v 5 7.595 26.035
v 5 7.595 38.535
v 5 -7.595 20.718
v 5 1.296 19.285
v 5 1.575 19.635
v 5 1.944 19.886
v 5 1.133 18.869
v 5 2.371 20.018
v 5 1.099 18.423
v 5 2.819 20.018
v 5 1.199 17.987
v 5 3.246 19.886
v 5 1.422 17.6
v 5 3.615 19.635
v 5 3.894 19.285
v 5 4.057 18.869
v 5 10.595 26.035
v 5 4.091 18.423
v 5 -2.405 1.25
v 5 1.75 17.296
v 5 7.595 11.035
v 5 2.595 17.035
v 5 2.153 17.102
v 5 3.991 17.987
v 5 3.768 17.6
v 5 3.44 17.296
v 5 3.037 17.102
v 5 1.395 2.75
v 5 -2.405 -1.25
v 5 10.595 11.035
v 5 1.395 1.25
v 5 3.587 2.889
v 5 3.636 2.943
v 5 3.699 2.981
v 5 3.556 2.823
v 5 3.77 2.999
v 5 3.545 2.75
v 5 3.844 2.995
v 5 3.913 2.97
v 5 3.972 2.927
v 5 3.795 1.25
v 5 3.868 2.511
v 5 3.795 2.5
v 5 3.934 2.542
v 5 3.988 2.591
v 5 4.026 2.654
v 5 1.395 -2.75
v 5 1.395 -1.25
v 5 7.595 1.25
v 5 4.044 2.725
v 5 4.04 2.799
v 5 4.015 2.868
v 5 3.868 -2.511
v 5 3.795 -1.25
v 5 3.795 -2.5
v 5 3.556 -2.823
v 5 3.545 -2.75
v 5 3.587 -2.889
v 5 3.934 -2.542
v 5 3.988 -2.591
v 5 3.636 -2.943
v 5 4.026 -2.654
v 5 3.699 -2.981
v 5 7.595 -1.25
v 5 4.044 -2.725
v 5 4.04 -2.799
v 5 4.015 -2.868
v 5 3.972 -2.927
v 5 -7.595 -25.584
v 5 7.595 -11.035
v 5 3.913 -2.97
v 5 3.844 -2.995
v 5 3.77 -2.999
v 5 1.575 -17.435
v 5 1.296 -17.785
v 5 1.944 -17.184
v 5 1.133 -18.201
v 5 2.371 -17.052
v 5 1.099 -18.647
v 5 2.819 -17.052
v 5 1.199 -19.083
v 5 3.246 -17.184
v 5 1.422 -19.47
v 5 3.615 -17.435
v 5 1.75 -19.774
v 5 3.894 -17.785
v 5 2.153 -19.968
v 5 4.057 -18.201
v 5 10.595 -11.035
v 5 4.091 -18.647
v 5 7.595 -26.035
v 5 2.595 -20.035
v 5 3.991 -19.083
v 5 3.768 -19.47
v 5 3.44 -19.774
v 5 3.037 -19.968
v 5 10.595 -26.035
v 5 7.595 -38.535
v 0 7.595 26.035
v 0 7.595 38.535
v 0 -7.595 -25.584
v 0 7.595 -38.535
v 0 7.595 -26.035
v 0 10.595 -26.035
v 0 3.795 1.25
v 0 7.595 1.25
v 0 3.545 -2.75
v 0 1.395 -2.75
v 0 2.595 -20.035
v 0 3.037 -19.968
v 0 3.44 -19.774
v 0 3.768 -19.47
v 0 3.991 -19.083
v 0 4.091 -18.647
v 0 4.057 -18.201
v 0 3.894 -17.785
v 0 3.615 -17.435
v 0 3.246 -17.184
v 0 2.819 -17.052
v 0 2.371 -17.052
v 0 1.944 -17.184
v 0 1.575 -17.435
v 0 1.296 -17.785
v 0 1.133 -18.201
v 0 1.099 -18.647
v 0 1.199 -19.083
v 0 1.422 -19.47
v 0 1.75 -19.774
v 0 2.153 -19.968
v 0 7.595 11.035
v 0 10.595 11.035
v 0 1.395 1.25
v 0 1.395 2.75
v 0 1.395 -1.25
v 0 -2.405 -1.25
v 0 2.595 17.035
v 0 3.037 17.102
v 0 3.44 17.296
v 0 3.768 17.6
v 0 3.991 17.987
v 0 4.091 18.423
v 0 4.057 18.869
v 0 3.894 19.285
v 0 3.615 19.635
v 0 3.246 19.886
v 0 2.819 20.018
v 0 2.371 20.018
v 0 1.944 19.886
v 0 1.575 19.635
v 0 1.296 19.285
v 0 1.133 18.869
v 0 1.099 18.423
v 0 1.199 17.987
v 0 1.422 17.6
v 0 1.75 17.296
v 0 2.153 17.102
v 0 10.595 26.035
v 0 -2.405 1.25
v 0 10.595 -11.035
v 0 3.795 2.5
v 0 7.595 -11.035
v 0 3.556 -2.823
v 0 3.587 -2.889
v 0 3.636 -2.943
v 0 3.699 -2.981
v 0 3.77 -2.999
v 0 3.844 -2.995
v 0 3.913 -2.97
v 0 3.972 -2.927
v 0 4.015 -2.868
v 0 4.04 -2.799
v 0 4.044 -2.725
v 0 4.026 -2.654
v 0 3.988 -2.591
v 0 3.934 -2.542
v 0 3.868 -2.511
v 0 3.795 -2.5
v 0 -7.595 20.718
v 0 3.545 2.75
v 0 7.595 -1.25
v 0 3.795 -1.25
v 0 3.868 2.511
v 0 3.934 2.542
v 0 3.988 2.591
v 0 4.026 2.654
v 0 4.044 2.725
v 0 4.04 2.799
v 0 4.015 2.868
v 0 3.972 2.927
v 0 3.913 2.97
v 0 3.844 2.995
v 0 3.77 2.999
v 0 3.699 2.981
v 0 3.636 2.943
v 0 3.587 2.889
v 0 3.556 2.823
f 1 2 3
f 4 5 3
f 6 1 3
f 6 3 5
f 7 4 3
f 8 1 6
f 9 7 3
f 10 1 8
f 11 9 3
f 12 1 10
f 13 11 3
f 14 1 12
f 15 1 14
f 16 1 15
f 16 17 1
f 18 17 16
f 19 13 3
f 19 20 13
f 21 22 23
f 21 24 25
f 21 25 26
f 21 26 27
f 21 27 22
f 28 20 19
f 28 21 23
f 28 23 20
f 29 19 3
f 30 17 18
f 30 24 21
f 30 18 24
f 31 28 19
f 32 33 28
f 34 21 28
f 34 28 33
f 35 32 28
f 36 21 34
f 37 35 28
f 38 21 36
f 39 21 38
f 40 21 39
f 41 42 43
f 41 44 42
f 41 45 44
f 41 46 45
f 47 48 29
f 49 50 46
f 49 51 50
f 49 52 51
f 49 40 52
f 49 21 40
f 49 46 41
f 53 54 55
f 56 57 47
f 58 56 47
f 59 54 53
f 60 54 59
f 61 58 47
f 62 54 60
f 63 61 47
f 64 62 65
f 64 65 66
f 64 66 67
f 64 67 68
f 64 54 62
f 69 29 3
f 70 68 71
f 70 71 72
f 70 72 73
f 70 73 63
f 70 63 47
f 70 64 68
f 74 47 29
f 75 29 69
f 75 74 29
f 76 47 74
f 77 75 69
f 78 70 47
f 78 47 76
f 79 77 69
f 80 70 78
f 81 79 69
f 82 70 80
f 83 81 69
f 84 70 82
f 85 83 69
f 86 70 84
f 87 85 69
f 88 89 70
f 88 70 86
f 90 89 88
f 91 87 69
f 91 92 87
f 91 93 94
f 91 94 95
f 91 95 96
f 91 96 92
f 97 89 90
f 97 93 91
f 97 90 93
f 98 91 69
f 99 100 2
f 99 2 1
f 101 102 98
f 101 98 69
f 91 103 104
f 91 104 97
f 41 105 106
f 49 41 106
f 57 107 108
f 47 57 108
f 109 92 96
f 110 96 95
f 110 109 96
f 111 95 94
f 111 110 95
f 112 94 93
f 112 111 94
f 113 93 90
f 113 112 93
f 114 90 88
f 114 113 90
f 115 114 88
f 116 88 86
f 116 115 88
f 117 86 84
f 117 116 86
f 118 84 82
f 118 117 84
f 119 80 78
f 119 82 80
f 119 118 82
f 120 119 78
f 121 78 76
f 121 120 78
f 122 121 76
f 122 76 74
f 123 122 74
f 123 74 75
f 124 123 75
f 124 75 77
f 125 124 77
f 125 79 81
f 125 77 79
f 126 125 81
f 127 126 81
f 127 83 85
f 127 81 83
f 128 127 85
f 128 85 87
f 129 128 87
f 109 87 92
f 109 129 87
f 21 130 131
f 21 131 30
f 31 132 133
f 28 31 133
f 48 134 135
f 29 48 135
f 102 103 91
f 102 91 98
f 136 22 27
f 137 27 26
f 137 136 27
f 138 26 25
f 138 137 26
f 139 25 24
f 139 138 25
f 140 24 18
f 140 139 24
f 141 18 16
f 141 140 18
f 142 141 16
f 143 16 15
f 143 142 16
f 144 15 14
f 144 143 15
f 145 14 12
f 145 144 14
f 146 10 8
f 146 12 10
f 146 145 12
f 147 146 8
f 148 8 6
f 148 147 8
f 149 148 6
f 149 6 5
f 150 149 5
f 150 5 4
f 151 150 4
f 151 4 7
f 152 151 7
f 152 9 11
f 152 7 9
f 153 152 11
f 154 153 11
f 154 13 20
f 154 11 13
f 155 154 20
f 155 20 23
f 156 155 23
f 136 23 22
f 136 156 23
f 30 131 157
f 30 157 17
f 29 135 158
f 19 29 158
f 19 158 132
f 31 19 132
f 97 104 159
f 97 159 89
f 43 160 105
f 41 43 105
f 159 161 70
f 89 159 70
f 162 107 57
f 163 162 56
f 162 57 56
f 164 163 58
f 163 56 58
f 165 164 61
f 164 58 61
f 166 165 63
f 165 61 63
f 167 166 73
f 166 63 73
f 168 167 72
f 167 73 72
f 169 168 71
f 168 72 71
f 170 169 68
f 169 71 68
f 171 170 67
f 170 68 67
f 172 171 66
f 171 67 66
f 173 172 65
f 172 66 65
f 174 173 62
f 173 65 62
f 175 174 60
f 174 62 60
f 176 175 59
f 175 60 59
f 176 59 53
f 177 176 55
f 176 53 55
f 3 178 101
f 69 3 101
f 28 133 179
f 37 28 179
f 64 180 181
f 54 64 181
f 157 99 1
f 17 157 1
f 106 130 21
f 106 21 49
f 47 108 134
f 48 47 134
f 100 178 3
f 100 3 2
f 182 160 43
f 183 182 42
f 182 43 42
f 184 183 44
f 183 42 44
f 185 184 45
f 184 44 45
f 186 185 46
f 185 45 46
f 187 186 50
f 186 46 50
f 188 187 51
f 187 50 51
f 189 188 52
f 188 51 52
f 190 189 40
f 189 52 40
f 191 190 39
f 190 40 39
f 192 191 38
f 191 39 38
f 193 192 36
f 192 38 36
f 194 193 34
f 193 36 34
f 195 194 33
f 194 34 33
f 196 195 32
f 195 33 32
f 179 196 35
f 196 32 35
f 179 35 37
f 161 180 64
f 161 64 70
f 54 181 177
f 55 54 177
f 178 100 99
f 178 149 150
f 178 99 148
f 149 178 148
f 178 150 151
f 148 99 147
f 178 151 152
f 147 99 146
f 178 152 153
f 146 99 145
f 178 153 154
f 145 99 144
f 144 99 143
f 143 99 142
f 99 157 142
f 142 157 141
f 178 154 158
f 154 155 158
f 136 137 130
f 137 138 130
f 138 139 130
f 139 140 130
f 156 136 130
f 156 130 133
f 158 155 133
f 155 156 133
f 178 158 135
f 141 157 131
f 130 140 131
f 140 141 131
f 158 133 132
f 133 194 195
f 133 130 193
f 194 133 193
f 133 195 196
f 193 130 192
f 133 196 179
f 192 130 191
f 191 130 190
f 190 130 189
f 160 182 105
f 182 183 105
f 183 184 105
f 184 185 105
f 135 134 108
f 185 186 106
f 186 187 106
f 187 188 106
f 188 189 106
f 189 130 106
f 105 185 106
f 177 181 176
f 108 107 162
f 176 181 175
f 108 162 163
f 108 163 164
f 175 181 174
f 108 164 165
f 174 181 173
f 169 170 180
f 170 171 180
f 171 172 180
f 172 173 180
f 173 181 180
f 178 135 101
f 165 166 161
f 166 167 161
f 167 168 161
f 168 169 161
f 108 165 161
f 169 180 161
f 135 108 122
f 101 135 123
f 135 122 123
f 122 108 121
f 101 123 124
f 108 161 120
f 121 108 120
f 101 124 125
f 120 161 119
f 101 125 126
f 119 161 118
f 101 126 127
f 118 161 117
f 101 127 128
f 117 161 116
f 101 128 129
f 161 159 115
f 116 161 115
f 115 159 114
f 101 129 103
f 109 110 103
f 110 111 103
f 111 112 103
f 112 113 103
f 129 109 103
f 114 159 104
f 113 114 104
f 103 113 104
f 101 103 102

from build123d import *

# Parameters (mm, degrees)
SCHIZZO1_W                   = 77.07
SCHIZZO1_H                   = 15.19
ESTRUSIONE_ESTRUSIONE1_DEPTH = 5
TAGLIO_ESTRUSIONE1_DEPTH     = 6
SCHIZZO3_R                   = 1.5
TAGLIO_ESTRUSIONE2_DEPTH     = 6
SCHIZZO4_W                   = 5
SCHIZZO4_H                   = 15
ESTRUSIONE_ESTRUSIONE2_DEPTH = 3
TAGLIO_ESTRUSIONE3_DEPTH     = 6
SCHIZZO7_R                   = 0.25
TAGLIO_ESTRUSIONE4_DEPTH     = 10


with BuildPart() as part:
    # Schizzo1 → Estrusione-Estrusione1 (new body)
    with BuildSketch(Plane(origin=(0, 0, 0), x_dir=(0, 0, -1), z_dir=(1, 0, 0))):
        Rectangle(SCHIZZO1_W, SCHIZZO1_H)
    extrude(amount=ESTRUSIONE_ESTRUSIONE1_DEPTH)

    # Schizzo2 → Taglio-Estrusione1 (cut, through all)
    with BuildSketch(Plane(origin=(0, 0, 0), x_dir=(0, 0, -1), z_dir=(1, 0, 0))):
        Polygon((38.535, 7.595), (25.584422571, -7.595), (38.535, -7.595), align=None)
        Polygon((-38.535, 7.595), (-38.535, -7.595), (-20.718334969, -7.595), align=None)
    extrude(amount=TAGLIO_ESTRUSIONE1_DEPTH, mode=Mode.SUBTRACT)

    # Schizzo3 → Taglio-Estrusione2 (cut, through all)
    with BuildSketch(Plane(origin=(0, 0, 0), x_dir=(0, 0, -1), z_dir=(1, 0, 0))):
        with Locations((-18.535, 2.595)):
            Circle(SCHIZZO3_R)
        with Locations((18.535, 2.595)):
            Circle(SCHIZZO3_R)
    extrude(amount=TAGLIO_ESTRUSIONE2_DEPTH, mode=Mode.SUBTRACT)

    # Schizzo4 → Estrusione-Estrusione2 (add)
    with BuildSketch(Plane(origin=(0, 7.595, 0), x_dir=(1, 0, 0), z_dir=(0, 1, 0))):
        with Locations((2.5, 18.535)):
            Rectangle(SCHIZZO4_W, SCHIZZO4_H)
        with Locations((2.5, -18.535)):
            Rectangle(SCHIZZO4_W, SCHIZZO4_H)
    extrude(amount=ESTRUSIONE_ESTRUSIONE2_DEPTH)

    # Schizzo6 → Taglio-Estrusione3 (cut, through all)
    with BuildSketch(Plane(origin=(0, 0, 0), x_dir=(0, 0, -1), z_dir=(1, 0, 0))):
        Polygon((-1.25, -2.405), (-1.25, 1.395), (-2.75, 1.395), (-2.75, 3.795), (-1.25, 3.795), (-1.25, 7.595), (1.25, 7.595), (1.25, 3.795), (2.75, 3.795), (2.75, 1.395), (1.25, 1.395), (1.25, -2.405), align=None)
    extrude(amount=TAGLIO_ESTRUSIONE3_DEPTH, mode=Mode.SUBTRACT)

    # Schizzo7 → Taglio-Estrusione4 (cut)
    with BuildSketch(Plane(origin=(5, 0, 0), x_dir=(0, 0, -1), z_dir=(1, 0, 0))):
        with Locations((-2.75, 3.795)):
            Circle(SCHIZZO7_R)
        with Locations((2.75, 3.795)):
            Circle(SCHIZZO7_R)
    extrude(amount=-TAGLIO_ESTRUSIONE4_DEPTH, mode=Mode.SUBTRACT)


solid = part.part
